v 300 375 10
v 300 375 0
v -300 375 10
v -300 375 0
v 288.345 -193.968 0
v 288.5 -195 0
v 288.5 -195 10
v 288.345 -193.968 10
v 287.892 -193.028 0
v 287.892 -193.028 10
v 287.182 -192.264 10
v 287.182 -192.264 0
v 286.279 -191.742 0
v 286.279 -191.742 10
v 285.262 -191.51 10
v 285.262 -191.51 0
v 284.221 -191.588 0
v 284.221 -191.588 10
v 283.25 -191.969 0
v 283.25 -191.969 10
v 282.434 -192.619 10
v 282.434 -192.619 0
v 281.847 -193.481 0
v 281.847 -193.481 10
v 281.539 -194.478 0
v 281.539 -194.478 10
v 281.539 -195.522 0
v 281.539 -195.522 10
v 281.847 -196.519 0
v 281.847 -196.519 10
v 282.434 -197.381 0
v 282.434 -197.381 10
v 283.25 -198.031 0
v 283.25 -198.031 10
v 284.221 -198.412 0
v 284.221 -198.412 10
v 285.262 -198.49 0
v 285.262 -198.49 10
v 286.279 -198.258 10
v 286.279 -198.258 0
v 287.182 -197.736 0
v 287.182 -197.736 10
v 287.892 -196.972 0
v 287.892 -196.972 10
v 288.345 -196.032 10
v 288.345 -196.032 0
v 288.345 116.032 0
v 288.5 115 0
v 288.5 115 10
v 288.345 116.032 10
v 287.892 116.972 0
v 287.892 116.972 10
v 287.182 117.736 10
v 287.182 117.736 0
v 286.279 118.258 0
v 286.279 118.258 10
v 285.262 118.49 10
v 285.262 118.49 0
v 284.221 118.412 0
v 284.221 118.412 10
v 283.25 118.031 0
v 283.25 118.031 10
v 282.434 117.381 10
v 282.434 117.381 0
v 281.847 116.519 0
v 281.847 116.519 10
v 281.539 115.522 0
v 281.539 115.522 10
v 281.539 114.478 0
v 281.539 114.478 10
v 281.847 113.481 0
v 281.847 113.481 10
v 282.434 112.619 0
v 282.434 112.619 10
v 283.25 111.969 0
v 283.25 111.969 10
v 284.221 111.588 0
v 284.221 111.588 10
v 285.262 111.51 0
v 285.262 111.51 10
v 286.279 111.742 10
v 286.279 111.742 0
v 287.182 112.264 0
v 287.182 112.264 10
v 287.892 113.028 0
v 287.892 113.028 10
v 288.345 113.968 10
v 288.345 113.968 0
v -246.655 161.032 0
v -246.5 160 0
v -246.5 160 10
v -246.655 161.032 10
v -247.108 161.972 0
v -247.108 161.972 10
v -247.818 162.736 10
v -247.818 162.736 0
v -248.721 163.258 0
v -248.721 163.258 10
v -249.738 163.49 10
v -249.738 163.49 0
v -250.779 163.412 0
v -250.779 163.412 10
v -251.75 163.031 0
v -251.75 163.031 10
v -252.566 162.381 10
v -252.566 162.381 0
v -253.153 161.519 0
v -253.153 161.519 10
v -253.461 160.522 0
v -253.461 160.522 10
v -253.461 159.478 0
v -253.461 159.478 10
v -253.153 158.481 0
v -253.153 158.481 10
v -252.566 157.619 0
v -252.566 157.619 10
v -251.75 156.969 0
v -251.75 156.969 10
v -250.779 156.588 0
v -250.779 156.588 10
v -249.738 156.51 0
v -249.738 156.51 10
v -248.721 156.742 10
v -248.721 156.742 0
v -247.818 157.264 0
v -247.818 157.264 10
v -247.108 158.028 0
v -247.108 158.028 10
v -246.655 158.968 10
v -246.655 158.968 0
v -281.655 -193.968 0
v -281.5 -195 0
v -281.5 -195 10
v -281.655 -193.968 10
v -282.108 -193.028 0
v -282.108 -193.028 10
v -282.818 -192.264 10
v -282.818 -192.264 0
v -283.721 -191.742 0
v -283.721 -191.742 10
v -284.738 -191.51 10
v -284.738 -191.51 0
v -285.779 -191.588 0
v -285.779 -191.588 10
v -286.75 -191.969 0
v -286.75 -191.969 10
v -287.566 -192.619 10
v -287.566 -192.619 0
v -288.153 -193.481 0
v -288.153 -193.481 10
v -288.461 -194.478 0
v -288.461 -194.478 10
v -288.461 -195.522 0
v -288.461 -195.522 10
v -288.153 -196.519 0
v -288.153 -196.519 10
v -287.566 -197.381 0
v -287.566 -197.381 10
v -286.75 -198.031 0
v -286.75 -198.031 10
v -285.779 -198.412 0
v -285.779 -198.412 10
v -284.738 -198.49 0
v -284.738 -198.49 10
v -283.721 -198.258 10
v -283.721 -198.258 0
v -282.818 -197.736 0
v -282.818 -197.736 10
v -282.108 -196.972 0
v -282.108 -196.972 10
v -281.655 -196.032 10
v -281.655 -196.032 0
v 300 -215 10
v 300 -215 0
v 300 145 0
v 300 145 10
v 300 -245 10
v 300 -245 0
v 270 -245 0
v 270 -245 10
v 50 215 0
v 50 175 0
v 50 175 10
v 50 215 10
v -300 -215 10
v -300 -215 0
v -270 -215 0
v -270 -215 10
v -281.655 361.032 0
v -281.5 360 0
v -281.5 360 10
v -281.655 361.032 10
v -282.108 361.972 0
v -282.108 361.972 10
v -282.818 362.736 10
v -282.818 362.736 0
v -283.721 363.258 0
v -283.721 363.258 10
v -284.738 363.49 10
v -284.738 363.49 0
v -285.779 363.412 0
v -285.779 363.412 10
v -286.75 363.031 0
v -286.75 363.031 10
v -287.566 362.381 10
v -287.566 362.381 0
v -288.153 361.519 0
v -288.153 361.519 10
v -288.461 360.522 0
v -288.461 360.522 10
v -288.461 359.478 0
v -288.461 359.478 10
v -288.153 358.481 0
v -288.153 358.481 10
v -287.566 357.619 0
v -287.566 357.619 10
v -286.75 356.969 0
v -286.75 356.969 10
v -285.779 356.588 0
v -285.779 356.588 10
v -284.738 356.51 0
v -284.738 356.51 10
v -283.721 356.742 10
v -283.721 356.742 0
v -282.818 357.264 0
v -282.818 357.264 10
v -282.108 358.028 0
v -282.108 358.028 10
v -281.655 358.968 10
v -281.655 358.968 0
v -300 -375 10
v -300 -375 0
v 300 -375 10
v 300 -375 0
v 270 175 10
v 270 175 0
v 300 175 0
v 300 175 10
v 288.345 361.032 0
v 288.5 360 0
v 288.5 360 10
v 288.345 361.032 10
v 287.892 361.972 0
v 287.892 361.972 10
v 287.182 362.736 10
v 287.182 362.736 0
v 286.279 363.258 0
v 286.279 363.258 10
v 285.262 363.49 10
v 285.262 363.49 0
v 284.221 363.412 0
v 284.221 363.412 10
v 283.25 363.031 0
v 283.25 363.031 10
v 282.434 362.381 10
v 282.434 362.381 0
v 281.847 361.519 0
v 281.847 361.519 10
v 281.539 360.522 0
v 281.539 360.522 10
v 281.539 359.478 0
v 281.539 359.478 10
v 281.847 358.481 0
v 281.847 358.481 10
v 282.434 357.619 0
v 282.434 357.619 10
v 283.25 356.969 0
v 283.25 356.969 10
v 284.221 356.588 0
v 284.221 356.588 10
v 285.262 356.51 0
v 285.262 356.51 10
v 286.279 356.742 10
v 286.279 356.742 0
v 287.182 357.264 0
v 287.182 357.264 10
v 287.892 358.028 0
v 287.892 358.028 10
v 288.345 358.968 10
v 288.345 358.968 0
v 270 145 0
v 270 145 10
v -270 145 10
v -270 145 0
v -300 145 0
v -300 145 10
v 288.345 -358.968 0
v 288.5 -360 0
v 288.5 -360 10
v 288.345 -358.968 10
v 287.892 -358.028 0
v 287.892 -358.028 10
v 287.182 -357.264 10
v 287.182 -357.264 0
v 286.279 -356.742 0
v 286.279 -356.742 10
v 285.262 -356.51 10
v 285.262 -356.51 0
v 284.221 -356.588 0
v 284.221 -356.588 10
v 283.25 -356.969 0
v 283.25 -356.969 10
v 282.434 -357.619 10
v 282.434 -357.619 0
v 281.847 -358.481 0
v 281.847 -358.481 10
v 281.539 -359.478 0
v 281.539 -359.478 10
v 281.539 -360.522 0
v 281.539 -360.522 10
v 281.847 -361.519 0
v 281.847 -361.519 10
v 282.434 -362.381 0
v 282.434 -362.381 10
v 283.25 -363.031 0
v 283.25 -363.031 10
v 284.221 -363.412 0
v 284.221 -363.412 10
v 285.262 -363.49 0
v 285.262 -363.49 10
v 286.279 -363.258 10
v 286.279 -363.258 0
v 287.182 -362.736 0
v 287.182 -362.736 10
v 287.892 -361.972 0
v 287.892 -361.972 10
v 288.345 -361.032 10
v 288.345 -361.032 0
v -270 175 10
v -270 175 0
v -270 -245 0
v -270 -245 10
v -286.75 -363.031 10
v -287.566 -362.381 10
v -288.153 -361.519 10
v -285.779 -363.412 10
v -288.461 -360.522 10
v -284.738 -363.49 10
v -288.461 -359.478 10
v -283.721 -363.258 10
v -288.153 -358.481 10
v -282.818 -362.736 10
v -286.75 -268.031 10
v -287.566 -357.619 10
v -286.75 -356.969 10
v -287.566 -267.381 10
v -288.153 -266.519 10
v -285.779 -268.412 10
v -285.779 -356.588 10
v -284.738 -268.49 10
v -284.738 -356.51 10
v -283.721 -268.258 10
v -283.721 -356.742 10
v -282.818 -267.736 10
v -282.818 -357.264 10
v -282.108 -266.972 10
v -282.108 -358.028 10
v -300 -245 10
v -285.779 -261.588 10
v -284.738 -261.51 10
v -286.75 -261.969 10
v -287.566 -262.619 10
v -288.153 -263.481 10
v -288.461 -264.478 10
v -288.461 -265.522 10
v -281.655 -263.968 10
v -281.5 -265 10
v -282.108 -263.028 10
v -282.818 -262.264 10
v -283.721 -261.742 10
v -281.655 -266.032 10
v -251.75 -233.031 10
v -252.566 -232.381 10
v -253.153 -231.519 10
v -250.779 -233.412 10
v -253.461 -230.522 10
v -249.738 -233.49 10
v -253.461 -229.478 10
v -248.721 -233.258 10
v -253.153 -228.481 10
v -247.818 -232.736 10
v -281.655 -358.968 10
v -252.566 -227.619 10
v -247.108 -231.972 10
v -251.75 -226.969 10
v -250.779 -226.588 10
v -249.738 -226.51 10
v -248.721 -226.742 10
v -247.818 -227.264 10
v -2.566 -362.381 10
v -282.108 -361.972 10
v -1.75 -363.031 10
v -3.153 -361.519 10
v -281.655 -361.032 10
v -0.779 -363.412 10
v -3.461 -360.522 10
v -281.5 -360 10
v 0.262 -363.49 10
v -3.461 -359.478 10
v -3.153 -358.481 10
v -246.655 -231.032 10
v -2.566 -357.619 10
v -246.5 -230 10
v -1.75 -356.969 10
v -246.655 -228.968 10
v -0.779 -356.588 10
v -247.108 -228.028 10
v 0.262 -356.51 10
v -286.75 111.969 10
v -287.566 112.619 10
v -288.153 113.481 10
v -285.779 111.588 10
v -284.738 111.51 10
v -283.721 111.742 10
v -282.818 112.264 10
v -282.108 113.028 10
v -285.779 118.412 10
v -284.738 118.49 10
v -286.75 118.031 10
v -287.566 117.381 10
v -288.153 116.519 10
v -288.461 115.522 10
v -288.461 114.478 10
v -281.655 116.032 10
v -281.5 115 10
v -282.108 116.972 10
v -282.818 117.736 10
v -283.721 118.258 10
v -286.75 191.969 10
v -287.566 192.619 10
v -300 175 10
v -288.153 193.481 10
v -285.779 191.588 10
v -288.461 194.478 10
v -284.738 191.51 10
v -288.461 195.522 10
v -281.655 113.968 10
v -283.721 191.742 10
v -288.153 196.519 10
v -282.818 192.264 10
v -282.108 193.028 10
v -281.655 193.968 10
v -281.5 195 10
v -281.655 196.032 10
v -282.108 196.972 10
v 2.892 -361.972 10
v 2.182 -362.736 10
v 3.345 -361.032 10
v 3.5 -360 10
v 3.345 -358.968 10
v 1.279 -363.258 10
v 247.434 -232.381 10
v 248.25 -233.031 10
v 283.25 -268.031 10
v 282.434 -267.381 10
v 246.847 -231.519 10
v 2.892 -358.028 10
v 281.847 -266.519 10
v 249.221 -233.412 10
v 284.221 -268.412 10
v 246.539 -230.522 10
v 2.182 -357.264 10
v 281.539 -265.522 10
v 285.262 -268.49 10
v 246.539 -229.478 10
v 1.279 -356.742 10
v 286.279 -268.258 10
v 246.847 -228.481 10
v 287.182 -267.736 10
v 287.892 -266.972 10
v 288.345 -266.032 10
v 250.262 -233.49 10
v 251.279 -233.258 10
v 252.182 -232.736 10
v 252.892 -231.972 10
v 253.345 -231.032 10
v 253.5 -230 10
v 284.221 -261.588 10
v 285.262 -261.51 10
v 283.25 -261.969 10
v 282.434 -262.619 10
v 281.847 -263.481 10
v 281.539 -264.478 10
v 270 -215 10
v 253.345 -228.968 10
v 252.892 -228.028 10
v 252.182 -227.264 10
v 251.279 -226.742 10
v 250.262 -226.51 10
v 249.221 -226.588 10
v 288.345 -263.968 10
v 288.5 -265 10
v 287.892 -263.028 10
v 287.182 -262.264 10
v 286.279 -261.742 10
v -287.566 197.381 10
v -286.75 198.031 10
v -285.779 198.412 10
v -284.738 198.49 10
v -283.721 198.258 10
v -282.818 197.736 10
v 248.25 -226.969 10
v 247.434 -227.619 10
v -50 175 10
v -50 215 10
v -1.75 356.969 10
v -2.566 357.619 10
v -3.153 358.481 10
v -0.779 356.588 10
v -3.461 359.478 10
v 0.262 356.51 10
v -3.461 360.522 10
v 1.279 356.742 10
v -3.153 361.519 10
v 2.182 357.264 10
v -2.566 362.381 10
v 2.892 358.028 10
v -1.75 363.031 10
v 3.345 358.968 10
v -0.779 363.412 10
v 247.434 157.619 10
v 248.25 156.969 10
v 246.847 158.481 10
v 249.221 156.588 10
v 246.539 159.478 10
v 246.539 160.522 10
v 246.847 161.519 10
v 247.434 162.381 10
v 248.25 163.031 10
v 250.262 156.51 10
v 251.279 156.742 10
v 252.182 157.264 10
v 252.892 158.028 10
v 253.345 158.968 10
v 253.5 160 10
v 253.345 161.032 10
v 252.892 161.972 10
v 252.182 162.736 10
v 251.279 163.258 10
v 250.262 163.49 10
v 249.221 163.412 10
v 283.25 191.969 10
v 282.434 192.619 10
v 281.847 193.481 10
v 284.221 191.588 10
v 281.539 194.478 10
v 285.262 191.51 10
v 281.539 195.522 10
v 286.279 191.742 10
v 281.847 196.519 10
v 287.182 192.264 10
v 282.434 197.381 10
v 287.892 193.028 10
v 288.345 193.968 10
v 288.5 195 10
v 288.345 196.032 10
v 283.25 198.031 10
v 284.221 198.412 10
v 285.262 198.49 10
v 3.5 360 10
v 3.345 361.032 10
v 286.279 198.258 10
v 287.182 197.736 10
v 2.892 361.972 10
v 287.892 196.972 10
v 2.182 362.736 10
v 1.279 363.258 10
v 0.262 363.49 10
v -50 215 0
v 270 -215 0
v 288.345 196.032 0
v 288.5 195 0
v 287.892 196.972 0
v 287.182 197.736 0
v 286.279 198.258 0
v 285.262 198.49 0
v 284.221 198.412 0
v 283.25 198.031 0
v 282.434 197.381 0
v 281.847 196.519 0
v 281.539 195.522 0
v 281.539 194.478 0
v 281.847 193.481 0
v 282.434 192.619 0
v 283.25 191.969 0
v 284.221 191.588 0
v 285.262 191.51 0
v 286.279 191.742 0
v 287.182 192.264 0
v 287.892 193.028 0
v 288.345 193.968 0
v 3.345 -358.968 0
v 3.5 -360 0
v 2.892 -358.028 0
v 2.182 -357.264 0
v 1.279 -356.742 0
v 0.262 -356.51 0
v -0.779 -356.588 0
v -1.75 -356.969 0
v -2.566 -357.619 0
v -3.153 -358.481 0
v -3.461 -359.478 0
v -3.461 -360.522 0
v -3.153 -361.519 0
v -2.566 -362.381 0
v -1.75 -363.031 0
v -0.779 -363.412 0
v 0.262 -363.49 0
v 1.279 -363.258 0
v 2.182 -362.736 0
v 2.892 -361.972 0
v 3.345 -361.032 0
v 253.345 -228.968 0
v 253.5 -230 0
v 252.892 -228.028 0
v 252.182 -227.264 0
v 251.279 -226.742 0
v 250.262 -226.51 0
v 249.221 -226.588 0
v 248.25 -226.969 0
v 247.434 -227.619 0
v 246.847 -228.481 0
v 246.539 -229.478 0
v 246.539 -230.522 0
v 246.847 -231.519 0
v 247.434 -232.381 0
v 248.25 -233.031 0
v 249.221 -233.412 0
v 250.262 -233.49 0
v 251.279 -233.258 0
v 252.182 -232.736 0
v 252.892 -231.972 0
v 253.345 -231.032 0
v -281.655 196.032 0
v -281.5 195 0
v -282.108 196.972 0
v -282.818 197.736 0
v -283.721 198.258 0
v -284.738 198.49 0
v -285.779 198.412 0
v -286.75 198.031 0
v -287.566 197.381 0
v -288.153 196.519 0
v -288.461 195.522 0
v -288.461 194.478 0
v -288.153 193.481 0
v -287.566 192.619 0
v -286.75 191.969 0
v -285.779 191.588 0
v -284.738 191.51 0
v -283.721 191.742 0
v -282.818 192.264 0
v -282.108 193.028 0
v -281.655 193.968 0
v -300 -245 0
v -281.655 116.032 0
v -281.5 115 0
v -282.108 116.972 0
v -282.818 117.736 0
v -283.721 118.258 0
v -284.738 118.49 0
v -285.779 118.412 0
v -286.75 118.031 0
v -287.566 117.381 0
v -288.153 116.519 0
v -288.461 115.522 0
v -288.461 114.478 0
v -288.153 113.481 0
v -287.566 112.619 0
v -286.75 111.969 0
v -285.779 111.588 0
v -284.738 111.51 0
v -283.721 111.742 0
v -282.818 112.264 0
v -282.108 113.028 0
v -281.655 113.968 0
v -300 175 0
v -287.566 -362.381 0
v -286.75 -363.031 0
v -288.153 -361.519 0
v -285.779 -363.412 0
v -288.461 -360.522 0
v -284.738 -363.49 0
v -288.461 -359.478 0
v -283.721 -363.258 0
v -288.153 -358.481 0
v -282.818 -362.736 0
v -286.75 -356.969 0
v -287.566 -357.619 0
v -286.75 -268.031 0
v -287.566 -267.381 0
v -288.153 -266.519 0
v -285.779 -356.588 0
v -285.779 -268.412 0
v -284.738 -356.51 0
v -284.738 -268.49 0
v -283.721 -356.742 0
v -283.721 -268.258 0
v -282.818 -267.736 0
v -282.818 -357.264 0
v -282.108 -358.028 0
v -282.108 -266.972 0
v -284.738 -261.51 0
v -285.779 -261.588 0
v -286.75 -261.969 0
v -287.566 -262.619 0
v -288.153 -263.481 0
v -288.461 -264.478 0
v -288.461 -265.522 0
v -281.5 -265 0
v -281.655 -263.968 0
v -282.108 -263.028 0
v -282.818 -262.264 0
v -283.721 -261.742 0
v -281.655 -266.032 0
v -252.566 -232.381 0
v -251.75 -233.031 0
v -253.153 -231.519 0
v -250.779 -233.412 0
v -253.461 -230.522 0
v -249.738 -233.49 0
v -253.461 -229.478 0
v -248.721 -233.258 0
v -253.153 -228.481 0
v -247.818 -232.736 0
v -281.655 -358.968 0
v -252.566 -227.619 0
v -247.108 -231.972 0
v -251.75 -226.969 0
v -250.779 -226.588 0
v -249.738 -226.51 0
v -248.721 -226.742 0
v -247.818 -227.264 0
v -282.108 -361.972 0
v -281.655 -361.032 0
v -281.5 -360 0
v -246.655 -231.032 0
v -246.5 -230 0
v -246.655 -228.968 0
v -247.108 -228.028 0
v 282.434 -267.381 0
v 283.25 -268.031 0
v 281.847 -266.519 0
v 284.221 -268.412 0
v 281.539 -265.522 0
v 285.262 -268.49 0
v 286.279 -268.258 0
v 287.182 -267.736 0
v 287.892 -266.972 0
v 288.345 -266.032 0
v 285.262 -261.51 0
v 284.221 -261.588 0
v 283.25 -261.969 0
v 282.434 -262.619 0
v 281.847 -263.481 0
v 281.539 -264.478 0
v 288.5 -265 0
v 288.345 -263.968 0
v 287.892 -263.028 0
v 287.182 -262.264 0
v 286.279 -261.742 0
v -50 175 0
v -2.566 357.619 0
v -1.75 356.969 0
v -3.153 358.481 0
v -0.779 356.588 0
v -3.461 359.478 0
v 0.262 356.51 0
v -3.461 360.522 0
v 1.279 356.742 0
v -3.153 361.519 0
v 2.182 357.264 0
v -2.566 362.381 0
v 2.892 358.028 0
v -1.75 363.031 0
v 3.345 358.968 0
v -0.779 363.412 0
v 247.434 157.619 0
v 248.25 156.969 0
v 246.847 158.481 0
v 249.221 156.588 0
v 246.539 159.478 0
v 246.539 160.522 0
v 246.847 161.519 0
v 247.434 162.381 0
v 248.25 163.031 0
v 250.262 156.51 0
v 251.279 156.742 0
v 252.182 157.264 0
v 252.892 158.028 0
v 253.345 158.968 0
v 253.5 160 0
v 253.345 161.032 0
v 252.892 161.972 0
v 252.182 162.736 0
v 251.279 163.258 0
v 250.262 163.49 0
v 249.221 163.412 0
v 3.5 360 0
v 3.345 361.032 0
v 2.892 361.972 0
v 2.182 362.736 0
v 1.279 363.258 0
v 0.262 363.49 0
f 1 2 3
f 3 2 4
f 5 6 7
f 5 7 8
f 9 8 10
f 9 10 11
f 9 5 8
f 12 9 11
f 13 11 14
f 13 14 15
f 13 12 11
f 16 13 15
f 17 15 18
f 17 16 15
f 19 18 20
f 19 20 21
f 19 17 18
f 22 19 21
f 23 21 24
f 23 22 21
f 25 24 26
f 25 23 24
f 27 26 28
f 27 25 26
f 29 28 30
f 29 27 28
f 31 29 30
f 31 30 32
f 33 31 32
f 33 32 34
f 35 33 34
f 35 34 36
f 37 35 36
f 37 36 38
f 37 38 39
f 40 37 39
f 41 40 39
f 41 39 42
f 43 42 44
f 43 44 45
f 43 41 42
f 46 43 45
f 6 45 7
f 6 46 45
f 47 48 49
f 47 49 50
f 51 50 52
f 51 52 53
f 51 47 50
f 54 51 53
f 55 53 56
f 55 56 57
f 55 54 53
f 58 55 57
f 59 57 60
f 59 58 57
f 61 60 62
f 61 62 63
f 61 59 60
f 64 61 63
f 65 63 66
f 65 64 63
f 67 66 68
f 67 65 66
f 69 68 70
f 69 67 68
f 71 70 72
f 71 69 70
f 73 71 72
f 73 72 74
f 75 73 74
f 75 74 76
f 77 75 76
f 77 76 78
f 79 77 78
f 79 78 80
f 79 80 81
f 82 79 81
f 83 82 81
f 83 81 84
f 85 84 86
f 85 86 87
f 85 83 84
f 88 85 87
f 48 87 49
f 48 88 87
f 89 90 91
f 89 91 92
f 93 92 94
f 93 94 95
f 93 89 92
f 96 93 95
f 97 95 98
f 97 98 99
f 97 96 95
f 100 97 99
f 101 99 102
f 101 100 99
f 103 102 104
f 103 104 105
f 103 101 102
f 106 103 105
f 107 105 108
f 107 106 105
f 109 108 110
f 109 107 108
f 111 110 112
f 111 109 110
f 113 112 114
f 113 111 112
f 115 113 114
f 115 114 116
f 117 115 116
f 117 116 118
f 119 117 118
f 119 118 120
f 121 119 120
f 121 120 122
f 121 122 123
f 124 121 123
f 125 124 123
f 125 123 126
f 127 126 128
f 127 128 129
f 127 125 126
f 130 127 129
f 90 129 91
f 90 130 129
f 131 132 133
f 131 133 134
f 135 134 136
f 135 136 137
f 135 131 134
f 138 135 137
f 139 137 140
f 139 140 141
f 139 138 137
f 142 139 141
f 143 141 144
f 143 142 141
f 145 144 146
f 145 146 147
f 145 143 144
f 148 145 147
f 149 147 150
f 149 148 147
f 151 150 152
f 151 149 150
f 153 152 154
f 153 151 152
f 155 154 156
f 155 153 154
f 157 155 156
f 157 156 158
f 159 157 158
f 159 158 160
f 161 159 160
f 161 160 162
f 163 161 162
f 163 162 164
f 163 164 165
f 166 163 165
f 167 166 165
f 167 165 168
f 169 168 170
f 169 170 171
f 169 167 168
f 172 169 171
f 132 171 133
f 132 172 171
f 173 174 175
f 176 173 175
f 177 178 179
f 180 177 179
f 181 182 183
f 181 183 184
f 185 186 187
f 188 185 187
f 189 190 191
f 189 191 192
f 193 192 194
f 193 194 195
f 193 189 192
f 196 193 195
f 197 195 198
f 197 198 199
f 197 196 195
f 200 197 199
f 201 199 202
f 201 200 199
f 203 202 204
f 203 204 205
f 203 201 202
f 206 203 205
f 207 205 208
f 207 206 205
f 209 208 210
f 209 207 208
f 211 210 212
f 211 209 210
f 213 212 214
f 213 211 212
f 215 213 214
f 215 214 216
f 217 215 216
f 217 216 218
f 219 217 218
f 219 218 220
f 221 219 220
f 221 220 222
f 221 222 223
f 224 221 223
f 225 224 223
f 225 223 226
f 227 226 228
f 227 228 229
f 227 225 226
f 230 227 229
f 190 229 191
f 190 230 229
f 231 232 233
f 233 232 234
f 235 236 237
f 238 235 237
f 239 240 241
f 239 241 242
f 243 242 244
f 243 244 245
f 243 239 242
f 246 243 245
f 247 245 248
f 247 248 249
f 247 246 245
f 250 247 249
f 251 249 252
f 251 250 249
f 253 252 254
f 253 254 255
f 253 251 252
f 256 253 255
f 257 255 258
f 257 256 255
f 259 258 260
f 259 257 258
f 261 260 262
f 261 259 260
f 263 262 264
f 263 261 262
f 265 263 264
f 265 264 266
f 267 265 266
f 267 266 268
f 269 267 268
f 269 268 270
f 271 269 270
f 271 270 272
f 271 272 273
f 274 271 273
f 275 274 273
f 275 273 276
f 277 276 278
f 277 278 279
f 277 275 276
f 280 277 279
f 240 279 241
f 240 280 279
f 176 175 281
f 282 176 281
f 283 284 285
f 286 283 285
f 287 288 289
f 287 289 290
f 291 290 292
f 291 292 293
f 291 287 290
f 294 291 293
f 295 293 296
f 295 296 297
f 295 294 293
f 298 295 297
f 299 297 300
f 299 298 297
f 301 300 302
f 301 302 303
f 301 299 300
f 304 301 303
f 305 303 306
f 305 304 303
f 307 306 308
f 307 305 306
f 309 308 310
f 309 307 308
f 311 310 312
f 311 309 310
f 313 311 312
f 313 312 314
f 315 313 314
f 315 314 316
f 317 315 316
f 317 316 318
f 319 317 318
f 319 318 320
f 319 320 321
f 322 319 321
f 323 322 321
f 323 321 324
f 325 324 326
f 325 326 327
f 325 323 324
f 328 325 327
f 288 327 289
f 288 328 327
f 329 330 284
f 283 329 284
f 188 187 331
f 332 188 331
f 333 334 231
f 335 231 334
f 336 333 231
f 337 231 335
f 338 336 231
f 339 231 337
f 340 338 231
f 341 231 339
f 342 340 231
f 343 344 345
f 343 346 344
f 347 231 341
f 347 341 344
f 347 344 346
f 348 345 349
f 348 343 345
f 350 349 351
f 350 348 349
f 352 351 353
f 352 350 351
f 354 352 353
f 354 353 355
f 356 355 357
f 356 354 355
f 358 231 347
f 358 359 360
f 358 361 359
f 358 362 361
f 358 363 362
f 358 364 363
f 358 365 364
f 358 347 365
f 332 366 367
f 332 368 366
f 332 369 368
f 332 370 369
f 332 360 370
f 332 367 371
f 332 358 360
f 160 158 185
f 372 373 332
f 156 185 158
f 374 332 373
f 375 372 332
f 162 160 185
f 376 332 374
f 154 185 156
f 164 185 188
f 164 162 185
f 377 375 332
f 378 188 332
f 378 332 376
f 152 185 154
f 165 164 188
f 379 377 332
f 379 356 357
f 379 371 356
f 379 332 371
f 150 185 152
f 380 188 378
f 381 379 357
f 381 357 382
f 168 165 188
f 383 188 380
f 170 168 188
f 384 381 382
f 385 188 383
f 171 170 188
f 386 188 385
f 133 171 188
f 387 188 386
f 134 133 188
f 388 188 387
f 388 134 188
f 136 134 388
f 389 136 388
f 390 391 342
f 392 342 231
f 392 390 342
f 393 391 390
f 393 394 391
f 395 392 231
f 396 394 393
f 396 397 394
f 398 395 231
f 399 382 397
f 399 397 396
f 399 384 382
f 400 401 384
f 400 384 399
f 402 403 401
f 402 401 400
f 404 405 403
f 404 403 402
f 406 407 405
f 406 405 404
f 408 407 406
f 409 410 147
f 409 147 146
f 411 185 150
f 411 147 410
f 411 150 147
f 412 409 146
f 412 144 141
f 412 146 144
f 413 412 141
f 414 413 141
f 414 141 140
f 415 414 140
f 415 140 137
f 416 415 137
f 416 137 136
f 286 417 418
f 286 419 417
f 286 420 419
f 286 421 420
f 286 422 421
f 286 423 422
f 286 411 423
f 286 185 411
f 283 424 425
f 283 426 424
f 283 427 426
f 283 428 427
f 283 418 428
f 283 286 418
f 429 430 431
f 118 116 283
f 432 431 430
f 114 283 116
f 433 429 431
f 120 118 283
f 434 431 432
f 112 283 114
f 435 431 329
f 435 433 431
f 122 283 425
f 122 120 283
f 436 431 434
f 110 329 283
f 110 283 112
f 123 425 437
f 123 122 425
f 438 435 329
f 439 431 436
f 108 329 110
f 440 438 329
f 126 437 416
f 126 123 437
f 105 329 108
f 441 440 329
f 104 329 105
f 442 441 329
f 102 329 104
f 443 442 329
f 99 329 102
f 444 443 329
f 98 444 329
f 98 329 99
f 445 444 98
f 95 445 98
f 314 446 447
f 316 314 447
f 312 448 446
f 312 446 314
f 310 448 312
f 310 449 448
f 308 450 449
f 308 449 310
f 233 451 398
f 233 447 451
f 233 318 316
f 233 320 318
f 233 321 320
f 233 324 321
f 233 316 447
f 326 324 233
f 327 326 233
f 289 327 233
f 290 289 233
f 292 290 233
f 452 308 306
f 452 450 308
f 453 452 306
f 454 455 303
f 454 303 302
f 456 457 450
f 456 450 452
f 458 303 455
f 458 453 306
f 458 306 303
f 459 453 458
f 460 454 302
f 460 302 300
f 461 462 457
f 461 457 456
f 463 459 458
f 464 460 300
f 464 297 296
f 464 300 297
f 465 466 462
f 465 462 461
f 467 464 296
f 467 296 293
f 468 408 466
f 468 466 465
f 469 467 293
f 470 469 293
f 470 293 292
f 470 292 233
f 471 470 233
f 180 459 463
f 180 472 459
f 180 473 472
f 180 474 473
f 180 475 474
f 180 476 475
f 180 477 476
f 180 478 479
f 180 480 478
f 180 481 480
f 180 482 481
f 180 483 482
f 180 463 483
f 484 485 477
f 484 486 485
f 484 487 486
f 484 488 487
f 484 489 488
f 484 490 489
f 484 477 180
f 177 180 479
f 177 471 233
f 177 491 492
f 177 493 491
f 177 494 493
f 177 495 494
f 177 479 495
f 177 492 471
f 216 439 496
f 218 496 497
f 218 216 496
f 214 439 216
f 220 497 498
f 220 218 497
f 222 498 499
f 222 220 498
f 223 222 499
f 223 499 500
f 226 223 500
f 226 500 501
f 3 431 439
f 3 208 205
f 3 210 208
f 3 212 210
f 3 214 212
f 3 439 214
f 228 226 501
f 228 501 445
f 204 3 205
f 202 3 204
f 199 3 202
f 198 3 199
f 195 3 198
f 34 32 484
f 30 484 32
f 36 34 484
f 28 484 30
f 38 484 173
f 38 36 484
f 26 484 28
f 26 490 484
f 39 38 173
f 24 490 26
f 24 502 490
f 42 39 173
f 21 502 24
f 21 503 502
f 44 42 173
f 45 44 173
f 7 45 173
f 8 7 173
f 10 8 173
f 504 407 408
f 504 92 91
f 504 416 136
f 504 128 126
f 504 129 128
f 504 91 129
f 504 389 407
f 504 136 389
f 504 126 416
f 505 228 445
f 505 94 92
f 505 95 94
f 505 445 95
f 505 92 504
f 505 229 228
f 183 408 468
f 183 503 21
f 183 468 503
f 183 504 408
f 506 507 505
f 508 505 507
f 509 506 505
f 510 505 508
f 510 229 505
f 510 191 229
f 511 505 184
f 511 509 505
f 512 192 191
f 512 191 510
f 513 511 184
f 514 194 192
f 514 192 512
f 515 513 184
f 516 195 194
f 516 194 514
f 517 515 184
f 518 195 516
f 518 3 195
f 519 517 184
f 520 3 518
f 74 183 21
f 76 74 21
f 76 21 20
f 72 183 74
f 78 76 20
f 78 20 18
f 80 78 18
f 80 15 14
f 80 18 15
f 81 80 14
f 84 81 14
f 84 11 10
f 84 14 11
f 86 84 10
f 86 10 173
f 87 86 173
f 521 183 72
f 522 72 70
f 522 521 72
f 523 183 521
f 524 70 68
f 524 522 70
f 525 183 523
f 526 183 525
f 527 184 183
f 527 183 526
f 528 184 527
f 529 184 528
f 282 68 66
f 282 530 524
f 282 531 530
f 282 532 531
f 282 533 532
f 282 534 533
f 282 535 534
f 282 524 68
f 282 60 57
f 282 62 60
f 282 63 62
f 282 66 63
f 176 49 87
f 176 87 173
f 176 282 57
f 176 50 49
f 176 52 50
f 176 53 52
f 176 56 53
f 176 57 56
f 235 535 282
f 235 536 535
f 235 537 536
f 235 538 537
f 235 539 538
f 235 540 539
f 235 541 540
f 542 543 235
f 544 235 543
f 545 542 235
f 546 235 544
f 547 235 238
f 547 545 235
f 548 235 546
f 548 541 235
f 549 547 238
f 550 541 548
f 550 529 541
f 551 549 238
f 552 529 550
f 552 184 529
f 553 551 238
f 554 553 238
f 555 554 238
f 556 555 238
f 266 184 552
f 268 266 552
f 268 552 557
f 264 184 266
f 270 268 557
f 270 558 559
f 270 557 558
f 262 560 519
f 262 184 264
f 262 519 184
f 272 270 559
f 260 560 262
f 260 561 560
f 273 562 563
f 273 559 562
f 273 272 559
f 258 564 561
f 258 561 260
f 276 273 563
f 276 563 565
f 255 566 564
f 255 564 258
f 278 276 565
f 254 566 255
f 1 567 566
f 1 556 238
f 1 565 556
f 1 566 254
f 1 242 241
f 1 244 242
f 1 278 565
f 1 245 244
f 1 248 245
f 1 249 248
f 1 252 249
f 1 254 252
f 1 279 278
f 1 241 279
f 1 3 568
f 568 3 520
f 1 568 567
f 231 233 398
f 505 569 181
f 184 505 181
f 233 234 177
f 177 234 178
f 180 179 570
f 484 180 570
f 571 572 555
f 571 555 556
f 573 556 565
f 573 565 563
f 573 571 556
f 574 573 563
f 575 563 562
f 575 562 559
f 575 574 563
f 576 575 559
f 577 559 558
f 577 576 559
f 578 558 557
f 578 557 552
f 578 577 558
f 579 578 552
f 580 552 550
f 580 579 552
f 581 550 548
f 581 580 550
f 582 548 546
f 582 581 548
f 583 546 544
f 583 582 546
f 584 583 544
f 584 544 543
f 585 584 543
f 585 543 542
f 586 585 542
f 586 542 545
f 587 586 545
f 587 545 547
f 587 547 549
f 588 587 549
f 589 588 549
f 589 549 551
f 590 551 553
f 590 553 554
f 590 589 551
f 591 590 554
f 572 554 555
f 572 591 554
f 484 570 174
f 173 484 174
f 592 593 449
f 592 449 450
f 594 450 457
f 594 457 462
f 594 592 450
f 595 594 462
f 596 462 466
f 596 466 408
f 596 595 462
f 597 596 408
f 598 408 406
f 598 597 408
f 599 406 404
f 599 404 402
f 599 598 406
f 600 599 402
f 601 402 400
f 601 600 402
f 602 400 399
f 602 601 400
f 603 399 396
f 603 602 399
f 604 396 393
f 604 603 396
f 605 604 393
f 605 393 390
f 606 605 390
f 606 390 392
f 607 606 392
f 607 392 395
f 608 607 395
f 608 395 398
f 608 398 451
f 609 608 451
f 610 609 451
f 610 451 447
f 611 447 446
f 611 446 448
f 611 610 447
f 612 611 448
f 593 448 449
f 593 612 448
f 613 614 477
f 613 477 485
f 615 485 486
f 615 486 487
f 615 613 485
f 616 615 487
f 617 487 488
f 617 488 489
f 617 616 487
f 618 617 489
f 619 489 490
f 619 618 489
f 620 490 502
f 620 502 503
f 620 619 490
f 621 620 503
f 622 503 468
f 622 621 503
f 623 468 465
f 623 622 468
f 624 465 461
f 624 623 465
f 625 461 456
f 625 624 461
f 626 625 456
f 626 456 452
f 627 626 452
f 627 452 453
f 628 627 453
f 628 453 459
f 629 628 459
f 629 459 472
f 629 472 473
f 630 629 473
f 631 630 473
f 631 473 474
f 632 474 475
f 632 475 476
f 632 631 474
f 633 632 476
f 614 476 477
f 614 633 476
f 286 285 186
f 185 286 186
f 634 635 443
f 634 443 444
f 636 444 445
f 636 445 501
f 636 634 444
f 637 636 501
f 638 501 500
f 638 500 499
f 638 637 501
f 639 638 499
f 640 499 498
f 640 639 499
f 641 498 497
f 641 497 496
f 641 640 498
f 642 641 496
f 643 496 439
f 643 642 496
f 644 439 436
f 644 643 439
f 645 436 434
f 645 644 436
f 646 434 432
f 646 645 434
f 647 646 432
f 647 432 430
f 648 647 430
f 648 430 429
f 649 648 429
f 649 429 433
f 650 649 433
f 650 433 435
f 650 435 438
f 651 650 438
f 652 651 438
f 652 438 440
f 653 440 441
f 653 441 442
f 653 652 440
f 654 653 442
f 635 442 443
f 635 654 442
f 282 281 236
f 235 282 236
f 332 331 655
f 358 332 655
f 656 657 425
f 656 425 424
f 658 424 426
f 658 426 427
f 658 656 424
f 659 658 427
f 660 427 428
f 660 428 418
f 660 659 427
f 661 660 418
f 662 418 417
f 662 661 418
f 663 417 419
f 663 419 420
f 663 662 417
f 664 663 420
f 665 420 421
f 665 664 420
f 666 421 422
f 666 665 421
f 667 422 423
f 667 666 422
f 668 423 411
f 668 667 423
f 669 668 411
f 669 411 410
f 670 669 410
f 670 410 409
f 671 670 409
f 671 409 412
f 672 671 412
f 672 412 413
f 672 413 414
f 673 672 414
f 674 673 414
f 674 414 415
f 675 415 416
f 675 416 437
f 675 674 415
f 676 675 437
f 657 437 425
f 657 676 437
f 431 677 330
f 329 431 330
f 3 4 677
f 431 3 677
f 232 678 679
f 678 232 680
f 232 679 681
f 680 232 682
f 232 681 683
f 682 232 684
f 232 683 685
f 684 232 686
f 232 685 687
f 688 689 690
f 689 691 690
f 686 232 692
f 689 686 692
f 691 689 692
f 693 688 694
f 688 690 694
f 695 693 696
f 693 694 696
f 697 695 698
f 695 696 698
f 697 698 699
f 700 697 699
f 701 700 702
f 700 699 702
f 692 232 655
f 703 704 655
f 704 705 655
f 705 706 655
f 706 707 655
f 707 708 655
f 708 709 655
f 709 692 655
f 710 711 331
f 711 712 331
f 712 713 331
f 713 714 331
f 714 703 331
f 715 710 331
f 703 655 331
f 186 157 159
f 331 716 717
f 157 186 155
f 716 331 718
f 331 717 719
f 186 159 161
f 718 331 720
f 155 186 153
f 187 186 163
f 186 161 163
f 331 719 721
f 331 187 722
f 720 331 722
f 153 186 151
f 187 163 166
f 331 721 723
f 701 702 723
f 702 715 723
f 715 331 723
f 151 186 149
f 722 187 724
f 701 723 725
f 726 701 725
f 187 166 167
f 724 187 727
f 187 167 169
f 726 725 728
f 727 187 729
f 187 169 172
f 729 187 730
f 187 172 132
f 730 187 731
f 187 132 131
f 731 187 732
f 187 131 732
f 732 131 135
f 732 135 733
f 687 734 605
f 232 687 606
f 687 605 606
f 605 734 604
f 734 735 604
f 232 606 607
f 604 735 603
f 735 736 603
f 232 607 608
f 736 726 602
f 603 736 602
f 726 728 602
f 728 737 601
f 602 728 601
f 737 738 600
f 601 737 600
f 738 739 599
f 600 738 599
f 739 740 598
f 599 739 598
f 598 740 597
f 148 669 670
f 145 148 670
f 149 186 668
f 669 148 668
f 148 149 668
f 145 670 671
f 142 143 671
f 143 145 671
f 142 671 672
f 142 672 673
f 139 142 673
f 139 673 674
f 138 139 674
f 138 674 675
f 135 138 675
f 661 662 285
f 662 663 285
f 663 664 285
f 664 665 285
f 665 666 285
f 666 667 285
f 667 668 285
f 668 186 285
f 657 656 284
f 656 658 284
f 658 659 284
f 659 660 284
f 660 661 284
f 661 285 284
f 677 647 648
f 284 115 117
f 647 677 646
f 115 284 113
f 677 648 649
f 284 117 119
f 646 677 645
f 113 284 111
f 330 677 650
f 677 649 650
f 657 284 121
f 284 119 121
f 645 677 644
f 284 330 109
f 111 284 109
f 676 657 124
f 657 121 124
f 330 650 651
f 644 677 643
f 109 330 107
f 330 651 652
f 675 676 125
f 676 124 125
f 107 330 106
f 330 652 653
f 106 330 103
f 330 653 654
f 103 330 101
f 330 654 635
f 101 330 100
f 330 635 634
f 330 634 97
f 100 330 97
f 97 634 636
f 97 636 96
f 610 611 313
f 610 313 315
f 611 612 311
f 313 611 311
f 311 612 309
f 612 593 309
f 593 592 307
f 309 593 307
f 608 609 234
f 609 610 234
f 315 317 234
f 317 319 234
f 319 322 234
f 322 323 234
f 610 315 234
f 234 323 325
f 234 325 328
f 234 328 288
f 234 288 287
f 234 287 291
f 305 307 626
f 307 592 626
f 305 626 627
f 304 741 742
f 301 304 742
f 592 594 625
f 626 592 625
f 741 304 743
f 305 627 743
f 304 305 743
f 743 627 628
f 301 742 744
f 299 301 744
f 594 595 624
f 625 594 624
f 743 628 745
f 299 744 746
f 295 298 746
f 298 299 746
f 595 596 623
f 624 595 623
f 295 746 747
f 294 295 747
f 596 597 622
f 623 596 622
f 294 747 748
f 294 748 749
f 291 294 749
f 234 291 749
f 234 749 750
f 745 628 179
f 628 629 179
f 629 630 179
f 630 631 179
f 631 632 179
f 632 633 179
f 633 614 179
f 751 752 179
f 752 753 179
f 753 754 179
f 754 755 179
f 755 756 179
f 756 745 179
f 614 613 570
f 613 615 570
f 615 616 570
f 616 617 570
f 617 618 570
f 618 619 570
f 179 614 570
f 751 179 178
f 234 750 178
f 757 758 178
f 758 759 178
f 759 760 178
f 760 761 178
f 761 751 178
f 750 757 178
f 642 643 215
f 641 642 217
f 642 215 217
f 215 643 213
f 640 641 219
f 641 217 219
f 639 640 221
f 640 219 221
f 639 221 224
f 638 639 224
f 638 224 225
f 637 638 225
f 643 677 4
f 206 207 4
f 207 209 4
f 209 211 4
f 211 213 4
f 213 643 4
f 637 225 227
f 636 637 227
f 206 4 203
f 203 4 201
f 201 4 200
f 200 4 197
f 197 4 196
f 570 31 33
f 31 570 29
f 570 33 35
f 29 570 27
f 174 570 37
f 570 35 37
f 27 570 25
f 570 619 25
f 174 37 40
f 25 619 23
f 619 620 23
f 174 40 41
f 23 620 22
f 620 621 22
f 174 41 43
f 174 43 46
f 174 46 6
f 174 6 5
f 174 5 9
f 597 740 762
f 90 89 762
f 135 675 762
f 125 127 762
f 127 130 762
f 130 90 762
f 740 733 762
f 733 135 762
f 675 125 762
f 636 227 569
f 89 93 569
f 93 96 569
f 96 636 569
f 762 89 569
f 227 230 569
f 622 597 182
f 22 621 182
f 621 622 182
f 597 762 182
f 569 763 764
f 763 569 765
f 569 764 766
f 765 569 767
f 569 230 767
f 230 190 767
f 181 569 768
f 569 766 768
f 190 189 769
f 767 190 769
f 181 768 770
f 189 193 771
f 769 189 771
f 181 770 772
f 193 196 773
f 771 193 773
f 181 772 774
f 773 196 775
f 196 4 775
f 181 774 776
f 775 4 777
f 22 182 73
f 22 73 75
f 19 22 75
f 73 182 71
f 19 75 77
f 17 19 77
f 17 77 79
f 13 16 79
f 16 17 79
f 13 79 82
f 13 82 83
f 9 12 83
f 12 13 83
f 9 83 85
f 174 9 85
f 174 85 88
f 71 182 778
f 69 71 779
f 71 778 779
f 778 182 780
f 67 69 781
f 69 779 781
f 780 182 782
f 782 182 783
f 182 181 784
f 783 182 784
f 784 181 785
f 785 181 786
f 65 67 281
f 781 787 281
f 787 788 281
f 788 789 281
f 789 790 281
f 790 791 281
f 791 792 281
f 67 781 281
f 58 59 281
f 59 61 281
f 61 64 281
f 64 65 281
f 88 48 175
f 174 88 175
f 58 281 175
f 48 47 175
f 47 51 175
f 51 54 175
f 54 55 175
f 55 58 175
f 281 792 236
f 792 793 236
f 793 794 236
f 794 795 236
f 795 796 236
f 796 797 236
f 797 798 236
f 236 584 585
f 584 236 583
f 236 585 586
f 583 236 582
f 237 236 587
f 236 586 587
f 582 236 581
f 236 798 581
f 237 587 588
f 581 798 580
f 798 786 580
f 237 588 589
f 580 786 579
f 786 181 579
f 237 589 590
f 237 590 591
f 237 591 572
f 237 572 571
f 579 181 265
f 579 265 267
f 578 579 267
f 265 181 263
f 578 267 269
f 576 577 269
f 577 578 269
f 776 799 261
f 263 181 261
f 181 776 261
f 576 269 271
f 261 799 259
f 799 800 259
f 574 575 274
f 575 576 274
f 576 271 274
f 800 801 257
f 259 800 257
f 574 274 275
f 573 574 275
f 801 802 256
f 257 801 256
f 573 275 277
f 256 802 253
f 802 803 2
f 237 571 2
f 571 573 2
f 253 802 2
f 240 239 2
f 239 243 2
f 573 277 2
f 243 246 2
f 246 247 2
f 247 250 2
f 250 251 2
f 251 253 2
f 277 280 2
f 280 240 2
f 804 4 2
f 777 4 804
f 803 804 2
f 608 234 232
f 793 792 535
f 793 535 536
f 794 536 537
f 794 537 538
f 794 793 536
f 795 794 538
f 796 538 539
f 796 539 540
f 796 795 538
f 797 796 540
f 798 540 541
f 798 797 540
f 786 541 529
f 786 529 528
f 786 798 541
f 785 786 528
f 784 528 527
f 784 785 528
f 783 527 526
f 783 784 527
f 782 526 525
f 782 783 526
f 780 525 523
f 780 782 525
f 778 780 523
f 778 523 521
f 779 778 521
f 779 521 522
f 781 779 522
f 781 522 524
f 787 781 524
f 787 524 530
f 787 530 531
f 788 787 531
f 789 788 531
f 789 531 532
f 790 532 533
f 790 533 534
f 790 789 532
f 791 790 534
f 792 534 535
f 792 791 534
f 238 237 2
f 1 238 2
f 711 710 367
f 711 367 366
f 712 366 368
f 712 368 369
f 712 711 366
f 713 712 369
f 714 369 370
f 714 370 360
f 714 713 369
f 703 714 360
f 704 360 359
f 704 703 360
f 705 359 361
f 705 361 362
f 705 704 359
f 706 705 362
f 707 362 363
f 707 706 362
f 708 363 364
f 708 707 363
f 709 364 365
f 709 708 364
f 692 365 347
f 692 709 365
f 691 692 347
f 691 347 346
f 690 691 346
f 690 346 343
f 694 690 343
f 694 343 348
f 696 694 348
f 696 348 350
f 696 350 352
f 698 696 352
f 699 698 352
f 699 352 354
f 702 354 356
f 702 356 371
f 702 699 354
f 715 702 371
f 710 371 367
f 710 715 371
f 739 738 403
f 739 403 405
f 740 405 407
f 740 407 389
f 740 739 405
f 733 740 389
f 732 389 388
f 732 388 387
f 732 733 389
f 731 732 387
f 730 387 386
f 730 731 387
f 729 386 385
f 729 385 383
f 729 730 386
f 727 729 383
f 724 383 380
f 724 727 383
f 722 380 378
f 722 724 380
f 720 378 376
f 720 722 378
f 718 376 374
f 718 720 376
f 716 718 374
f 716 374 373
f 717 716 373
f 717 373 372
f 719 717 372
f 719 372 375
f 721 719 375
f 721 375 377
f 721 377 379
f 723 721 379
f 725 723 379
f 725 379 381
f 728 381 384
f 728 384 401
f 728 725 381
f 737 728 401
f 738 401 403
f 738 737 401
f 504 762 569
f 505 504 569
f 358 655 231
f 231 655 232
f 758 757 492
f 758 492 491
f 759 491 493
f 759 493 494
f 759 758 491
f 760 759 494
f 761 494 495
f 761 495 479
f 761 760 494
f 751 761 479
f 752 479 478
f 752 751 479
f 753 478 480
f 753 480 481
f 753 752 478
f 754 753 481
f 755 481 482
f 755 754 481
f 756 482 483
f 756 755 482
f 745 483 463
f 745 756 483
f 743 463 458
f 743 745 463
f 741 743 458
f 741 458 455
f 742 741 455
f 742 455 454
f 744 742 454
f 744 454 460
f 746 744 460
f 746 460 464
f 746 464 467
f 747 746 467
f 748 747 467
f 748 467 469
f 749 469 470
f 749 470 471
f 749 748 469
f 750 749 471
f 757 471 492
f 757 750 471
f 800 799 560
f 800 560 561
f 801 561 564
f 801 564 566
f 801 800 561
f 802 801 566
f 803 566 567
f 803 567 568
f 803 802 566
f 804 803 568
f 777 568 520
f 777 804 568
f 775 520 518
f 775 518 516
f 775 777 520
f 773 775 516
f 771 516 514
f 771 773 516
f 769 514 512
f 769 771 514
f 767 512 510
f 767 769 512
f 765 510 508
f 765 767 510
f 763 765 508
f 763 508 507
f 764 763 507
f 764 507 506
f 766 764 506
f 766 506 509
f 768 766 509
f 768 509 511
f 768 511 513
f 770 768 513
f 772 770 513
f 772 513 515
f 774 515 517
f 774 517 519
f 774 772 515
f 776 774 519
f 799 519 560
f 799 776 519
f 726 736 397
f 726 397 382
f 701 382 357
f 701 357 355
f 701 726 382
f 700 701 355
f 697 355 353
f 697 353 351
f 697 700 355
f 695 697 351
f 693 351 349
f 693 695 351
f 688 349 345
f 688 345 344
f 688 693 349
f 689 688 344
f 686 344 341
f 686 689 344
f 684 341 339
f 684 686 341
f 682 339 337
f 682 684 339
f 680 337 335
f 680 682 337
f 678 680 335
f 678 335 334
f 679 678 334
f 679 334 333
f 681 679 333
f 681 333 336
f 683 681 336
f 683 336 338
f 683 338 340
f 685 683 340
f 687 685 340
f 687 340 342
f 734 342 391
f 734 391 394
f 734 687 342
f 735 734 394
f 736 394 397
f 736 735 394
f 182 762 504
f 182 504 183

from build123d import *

# Parameters (mm, degrees)
F0_R     = 3.5
F0_W     = 100
F0_H     = 40
F1_DEPTH = 10


with BuildPart() as f1:
    # F0 (on Top) → F1 (new body)
    with BuildSketch(Plane.XY):
        Polygon((300, 175), (300, 375), (-300, 375), (-300, 175), (-270, 175), (-270, 145), (-300, 145), (-300, -215), (-270, -215), (-270, -245), (-300, -245), (-300, -375), (300, -375), (300, -245), (270, -245), (270, -215), (300, -215), (300, 145), (270, 145), (270, 175), align=None)
        with Locations((-285, -360)):
            Circle(F0_R, mode=Mode.SUBTRACT)
        with Locations((-285, -265)):
            Circle(F0_R, mode=Mode.SUBTRACT)
        with Locations((-285, -195)):
            Circle(F0_R, mode=Mode.SUBTRACT)
        with Locations((-250, -230)):
            Circle(F0_R, mode=Mode.SUBTRACT)
        with Locations((0, -360)):
            Circle(F0_R, mode=Mode.SUBTRACT)
        with Locations((285, -360)):
            Circle(F0_R, mode=Mode.SUBTRACT)
        with Locations((285, -265)):
            Circle(F0_R, mode=Mode.SUBTRACT)
        with Locations((250, -230)):
            Circle(F0_R, mode=Mode.SUBTRACT)
        with Locations((285, -195)):
            Circle(F0_R, mode=Mode.SUBTRACT)
        with Locations((-285, 115)):
            Circle(F0_R, mode=Mode.SUBTRACT)
        with Locations((-250, 160)):
            Circle(F0_R, mode=Mode.SUBTRACT)
        with Locations((-285, 195)):
            Circle(F0_R, mode=Mode.SUBTRACT)
        with Locations((-285, 360)):
            Circle(F0_R, mode=Mode.SUBTRACT)
        with Locations((285, 115)):
            Circle(F0_R, mode=Mode.SUBTRACT)
        with Locations((250, 160)):
            Circle(F0_R, mode=Mode.SUBTRACT)
        with Locations((0, 195)):
            Rectangle(F0_W, F0_H, mode=Mode.SUBTRACT)
        with Locations((0, 360)):
            Circle(F0_R, mode=Mode.SUBTRACT)
        with Locations((285, 195)):
            Circle(F0_R, mode=Mode.SUBTRACT)
        with Locations((285, 360)):
            Circle(F0_R, mode=Mode.SUBTRACT)
    extrude(amount=F1_DEPTH)


solid = f1.part
